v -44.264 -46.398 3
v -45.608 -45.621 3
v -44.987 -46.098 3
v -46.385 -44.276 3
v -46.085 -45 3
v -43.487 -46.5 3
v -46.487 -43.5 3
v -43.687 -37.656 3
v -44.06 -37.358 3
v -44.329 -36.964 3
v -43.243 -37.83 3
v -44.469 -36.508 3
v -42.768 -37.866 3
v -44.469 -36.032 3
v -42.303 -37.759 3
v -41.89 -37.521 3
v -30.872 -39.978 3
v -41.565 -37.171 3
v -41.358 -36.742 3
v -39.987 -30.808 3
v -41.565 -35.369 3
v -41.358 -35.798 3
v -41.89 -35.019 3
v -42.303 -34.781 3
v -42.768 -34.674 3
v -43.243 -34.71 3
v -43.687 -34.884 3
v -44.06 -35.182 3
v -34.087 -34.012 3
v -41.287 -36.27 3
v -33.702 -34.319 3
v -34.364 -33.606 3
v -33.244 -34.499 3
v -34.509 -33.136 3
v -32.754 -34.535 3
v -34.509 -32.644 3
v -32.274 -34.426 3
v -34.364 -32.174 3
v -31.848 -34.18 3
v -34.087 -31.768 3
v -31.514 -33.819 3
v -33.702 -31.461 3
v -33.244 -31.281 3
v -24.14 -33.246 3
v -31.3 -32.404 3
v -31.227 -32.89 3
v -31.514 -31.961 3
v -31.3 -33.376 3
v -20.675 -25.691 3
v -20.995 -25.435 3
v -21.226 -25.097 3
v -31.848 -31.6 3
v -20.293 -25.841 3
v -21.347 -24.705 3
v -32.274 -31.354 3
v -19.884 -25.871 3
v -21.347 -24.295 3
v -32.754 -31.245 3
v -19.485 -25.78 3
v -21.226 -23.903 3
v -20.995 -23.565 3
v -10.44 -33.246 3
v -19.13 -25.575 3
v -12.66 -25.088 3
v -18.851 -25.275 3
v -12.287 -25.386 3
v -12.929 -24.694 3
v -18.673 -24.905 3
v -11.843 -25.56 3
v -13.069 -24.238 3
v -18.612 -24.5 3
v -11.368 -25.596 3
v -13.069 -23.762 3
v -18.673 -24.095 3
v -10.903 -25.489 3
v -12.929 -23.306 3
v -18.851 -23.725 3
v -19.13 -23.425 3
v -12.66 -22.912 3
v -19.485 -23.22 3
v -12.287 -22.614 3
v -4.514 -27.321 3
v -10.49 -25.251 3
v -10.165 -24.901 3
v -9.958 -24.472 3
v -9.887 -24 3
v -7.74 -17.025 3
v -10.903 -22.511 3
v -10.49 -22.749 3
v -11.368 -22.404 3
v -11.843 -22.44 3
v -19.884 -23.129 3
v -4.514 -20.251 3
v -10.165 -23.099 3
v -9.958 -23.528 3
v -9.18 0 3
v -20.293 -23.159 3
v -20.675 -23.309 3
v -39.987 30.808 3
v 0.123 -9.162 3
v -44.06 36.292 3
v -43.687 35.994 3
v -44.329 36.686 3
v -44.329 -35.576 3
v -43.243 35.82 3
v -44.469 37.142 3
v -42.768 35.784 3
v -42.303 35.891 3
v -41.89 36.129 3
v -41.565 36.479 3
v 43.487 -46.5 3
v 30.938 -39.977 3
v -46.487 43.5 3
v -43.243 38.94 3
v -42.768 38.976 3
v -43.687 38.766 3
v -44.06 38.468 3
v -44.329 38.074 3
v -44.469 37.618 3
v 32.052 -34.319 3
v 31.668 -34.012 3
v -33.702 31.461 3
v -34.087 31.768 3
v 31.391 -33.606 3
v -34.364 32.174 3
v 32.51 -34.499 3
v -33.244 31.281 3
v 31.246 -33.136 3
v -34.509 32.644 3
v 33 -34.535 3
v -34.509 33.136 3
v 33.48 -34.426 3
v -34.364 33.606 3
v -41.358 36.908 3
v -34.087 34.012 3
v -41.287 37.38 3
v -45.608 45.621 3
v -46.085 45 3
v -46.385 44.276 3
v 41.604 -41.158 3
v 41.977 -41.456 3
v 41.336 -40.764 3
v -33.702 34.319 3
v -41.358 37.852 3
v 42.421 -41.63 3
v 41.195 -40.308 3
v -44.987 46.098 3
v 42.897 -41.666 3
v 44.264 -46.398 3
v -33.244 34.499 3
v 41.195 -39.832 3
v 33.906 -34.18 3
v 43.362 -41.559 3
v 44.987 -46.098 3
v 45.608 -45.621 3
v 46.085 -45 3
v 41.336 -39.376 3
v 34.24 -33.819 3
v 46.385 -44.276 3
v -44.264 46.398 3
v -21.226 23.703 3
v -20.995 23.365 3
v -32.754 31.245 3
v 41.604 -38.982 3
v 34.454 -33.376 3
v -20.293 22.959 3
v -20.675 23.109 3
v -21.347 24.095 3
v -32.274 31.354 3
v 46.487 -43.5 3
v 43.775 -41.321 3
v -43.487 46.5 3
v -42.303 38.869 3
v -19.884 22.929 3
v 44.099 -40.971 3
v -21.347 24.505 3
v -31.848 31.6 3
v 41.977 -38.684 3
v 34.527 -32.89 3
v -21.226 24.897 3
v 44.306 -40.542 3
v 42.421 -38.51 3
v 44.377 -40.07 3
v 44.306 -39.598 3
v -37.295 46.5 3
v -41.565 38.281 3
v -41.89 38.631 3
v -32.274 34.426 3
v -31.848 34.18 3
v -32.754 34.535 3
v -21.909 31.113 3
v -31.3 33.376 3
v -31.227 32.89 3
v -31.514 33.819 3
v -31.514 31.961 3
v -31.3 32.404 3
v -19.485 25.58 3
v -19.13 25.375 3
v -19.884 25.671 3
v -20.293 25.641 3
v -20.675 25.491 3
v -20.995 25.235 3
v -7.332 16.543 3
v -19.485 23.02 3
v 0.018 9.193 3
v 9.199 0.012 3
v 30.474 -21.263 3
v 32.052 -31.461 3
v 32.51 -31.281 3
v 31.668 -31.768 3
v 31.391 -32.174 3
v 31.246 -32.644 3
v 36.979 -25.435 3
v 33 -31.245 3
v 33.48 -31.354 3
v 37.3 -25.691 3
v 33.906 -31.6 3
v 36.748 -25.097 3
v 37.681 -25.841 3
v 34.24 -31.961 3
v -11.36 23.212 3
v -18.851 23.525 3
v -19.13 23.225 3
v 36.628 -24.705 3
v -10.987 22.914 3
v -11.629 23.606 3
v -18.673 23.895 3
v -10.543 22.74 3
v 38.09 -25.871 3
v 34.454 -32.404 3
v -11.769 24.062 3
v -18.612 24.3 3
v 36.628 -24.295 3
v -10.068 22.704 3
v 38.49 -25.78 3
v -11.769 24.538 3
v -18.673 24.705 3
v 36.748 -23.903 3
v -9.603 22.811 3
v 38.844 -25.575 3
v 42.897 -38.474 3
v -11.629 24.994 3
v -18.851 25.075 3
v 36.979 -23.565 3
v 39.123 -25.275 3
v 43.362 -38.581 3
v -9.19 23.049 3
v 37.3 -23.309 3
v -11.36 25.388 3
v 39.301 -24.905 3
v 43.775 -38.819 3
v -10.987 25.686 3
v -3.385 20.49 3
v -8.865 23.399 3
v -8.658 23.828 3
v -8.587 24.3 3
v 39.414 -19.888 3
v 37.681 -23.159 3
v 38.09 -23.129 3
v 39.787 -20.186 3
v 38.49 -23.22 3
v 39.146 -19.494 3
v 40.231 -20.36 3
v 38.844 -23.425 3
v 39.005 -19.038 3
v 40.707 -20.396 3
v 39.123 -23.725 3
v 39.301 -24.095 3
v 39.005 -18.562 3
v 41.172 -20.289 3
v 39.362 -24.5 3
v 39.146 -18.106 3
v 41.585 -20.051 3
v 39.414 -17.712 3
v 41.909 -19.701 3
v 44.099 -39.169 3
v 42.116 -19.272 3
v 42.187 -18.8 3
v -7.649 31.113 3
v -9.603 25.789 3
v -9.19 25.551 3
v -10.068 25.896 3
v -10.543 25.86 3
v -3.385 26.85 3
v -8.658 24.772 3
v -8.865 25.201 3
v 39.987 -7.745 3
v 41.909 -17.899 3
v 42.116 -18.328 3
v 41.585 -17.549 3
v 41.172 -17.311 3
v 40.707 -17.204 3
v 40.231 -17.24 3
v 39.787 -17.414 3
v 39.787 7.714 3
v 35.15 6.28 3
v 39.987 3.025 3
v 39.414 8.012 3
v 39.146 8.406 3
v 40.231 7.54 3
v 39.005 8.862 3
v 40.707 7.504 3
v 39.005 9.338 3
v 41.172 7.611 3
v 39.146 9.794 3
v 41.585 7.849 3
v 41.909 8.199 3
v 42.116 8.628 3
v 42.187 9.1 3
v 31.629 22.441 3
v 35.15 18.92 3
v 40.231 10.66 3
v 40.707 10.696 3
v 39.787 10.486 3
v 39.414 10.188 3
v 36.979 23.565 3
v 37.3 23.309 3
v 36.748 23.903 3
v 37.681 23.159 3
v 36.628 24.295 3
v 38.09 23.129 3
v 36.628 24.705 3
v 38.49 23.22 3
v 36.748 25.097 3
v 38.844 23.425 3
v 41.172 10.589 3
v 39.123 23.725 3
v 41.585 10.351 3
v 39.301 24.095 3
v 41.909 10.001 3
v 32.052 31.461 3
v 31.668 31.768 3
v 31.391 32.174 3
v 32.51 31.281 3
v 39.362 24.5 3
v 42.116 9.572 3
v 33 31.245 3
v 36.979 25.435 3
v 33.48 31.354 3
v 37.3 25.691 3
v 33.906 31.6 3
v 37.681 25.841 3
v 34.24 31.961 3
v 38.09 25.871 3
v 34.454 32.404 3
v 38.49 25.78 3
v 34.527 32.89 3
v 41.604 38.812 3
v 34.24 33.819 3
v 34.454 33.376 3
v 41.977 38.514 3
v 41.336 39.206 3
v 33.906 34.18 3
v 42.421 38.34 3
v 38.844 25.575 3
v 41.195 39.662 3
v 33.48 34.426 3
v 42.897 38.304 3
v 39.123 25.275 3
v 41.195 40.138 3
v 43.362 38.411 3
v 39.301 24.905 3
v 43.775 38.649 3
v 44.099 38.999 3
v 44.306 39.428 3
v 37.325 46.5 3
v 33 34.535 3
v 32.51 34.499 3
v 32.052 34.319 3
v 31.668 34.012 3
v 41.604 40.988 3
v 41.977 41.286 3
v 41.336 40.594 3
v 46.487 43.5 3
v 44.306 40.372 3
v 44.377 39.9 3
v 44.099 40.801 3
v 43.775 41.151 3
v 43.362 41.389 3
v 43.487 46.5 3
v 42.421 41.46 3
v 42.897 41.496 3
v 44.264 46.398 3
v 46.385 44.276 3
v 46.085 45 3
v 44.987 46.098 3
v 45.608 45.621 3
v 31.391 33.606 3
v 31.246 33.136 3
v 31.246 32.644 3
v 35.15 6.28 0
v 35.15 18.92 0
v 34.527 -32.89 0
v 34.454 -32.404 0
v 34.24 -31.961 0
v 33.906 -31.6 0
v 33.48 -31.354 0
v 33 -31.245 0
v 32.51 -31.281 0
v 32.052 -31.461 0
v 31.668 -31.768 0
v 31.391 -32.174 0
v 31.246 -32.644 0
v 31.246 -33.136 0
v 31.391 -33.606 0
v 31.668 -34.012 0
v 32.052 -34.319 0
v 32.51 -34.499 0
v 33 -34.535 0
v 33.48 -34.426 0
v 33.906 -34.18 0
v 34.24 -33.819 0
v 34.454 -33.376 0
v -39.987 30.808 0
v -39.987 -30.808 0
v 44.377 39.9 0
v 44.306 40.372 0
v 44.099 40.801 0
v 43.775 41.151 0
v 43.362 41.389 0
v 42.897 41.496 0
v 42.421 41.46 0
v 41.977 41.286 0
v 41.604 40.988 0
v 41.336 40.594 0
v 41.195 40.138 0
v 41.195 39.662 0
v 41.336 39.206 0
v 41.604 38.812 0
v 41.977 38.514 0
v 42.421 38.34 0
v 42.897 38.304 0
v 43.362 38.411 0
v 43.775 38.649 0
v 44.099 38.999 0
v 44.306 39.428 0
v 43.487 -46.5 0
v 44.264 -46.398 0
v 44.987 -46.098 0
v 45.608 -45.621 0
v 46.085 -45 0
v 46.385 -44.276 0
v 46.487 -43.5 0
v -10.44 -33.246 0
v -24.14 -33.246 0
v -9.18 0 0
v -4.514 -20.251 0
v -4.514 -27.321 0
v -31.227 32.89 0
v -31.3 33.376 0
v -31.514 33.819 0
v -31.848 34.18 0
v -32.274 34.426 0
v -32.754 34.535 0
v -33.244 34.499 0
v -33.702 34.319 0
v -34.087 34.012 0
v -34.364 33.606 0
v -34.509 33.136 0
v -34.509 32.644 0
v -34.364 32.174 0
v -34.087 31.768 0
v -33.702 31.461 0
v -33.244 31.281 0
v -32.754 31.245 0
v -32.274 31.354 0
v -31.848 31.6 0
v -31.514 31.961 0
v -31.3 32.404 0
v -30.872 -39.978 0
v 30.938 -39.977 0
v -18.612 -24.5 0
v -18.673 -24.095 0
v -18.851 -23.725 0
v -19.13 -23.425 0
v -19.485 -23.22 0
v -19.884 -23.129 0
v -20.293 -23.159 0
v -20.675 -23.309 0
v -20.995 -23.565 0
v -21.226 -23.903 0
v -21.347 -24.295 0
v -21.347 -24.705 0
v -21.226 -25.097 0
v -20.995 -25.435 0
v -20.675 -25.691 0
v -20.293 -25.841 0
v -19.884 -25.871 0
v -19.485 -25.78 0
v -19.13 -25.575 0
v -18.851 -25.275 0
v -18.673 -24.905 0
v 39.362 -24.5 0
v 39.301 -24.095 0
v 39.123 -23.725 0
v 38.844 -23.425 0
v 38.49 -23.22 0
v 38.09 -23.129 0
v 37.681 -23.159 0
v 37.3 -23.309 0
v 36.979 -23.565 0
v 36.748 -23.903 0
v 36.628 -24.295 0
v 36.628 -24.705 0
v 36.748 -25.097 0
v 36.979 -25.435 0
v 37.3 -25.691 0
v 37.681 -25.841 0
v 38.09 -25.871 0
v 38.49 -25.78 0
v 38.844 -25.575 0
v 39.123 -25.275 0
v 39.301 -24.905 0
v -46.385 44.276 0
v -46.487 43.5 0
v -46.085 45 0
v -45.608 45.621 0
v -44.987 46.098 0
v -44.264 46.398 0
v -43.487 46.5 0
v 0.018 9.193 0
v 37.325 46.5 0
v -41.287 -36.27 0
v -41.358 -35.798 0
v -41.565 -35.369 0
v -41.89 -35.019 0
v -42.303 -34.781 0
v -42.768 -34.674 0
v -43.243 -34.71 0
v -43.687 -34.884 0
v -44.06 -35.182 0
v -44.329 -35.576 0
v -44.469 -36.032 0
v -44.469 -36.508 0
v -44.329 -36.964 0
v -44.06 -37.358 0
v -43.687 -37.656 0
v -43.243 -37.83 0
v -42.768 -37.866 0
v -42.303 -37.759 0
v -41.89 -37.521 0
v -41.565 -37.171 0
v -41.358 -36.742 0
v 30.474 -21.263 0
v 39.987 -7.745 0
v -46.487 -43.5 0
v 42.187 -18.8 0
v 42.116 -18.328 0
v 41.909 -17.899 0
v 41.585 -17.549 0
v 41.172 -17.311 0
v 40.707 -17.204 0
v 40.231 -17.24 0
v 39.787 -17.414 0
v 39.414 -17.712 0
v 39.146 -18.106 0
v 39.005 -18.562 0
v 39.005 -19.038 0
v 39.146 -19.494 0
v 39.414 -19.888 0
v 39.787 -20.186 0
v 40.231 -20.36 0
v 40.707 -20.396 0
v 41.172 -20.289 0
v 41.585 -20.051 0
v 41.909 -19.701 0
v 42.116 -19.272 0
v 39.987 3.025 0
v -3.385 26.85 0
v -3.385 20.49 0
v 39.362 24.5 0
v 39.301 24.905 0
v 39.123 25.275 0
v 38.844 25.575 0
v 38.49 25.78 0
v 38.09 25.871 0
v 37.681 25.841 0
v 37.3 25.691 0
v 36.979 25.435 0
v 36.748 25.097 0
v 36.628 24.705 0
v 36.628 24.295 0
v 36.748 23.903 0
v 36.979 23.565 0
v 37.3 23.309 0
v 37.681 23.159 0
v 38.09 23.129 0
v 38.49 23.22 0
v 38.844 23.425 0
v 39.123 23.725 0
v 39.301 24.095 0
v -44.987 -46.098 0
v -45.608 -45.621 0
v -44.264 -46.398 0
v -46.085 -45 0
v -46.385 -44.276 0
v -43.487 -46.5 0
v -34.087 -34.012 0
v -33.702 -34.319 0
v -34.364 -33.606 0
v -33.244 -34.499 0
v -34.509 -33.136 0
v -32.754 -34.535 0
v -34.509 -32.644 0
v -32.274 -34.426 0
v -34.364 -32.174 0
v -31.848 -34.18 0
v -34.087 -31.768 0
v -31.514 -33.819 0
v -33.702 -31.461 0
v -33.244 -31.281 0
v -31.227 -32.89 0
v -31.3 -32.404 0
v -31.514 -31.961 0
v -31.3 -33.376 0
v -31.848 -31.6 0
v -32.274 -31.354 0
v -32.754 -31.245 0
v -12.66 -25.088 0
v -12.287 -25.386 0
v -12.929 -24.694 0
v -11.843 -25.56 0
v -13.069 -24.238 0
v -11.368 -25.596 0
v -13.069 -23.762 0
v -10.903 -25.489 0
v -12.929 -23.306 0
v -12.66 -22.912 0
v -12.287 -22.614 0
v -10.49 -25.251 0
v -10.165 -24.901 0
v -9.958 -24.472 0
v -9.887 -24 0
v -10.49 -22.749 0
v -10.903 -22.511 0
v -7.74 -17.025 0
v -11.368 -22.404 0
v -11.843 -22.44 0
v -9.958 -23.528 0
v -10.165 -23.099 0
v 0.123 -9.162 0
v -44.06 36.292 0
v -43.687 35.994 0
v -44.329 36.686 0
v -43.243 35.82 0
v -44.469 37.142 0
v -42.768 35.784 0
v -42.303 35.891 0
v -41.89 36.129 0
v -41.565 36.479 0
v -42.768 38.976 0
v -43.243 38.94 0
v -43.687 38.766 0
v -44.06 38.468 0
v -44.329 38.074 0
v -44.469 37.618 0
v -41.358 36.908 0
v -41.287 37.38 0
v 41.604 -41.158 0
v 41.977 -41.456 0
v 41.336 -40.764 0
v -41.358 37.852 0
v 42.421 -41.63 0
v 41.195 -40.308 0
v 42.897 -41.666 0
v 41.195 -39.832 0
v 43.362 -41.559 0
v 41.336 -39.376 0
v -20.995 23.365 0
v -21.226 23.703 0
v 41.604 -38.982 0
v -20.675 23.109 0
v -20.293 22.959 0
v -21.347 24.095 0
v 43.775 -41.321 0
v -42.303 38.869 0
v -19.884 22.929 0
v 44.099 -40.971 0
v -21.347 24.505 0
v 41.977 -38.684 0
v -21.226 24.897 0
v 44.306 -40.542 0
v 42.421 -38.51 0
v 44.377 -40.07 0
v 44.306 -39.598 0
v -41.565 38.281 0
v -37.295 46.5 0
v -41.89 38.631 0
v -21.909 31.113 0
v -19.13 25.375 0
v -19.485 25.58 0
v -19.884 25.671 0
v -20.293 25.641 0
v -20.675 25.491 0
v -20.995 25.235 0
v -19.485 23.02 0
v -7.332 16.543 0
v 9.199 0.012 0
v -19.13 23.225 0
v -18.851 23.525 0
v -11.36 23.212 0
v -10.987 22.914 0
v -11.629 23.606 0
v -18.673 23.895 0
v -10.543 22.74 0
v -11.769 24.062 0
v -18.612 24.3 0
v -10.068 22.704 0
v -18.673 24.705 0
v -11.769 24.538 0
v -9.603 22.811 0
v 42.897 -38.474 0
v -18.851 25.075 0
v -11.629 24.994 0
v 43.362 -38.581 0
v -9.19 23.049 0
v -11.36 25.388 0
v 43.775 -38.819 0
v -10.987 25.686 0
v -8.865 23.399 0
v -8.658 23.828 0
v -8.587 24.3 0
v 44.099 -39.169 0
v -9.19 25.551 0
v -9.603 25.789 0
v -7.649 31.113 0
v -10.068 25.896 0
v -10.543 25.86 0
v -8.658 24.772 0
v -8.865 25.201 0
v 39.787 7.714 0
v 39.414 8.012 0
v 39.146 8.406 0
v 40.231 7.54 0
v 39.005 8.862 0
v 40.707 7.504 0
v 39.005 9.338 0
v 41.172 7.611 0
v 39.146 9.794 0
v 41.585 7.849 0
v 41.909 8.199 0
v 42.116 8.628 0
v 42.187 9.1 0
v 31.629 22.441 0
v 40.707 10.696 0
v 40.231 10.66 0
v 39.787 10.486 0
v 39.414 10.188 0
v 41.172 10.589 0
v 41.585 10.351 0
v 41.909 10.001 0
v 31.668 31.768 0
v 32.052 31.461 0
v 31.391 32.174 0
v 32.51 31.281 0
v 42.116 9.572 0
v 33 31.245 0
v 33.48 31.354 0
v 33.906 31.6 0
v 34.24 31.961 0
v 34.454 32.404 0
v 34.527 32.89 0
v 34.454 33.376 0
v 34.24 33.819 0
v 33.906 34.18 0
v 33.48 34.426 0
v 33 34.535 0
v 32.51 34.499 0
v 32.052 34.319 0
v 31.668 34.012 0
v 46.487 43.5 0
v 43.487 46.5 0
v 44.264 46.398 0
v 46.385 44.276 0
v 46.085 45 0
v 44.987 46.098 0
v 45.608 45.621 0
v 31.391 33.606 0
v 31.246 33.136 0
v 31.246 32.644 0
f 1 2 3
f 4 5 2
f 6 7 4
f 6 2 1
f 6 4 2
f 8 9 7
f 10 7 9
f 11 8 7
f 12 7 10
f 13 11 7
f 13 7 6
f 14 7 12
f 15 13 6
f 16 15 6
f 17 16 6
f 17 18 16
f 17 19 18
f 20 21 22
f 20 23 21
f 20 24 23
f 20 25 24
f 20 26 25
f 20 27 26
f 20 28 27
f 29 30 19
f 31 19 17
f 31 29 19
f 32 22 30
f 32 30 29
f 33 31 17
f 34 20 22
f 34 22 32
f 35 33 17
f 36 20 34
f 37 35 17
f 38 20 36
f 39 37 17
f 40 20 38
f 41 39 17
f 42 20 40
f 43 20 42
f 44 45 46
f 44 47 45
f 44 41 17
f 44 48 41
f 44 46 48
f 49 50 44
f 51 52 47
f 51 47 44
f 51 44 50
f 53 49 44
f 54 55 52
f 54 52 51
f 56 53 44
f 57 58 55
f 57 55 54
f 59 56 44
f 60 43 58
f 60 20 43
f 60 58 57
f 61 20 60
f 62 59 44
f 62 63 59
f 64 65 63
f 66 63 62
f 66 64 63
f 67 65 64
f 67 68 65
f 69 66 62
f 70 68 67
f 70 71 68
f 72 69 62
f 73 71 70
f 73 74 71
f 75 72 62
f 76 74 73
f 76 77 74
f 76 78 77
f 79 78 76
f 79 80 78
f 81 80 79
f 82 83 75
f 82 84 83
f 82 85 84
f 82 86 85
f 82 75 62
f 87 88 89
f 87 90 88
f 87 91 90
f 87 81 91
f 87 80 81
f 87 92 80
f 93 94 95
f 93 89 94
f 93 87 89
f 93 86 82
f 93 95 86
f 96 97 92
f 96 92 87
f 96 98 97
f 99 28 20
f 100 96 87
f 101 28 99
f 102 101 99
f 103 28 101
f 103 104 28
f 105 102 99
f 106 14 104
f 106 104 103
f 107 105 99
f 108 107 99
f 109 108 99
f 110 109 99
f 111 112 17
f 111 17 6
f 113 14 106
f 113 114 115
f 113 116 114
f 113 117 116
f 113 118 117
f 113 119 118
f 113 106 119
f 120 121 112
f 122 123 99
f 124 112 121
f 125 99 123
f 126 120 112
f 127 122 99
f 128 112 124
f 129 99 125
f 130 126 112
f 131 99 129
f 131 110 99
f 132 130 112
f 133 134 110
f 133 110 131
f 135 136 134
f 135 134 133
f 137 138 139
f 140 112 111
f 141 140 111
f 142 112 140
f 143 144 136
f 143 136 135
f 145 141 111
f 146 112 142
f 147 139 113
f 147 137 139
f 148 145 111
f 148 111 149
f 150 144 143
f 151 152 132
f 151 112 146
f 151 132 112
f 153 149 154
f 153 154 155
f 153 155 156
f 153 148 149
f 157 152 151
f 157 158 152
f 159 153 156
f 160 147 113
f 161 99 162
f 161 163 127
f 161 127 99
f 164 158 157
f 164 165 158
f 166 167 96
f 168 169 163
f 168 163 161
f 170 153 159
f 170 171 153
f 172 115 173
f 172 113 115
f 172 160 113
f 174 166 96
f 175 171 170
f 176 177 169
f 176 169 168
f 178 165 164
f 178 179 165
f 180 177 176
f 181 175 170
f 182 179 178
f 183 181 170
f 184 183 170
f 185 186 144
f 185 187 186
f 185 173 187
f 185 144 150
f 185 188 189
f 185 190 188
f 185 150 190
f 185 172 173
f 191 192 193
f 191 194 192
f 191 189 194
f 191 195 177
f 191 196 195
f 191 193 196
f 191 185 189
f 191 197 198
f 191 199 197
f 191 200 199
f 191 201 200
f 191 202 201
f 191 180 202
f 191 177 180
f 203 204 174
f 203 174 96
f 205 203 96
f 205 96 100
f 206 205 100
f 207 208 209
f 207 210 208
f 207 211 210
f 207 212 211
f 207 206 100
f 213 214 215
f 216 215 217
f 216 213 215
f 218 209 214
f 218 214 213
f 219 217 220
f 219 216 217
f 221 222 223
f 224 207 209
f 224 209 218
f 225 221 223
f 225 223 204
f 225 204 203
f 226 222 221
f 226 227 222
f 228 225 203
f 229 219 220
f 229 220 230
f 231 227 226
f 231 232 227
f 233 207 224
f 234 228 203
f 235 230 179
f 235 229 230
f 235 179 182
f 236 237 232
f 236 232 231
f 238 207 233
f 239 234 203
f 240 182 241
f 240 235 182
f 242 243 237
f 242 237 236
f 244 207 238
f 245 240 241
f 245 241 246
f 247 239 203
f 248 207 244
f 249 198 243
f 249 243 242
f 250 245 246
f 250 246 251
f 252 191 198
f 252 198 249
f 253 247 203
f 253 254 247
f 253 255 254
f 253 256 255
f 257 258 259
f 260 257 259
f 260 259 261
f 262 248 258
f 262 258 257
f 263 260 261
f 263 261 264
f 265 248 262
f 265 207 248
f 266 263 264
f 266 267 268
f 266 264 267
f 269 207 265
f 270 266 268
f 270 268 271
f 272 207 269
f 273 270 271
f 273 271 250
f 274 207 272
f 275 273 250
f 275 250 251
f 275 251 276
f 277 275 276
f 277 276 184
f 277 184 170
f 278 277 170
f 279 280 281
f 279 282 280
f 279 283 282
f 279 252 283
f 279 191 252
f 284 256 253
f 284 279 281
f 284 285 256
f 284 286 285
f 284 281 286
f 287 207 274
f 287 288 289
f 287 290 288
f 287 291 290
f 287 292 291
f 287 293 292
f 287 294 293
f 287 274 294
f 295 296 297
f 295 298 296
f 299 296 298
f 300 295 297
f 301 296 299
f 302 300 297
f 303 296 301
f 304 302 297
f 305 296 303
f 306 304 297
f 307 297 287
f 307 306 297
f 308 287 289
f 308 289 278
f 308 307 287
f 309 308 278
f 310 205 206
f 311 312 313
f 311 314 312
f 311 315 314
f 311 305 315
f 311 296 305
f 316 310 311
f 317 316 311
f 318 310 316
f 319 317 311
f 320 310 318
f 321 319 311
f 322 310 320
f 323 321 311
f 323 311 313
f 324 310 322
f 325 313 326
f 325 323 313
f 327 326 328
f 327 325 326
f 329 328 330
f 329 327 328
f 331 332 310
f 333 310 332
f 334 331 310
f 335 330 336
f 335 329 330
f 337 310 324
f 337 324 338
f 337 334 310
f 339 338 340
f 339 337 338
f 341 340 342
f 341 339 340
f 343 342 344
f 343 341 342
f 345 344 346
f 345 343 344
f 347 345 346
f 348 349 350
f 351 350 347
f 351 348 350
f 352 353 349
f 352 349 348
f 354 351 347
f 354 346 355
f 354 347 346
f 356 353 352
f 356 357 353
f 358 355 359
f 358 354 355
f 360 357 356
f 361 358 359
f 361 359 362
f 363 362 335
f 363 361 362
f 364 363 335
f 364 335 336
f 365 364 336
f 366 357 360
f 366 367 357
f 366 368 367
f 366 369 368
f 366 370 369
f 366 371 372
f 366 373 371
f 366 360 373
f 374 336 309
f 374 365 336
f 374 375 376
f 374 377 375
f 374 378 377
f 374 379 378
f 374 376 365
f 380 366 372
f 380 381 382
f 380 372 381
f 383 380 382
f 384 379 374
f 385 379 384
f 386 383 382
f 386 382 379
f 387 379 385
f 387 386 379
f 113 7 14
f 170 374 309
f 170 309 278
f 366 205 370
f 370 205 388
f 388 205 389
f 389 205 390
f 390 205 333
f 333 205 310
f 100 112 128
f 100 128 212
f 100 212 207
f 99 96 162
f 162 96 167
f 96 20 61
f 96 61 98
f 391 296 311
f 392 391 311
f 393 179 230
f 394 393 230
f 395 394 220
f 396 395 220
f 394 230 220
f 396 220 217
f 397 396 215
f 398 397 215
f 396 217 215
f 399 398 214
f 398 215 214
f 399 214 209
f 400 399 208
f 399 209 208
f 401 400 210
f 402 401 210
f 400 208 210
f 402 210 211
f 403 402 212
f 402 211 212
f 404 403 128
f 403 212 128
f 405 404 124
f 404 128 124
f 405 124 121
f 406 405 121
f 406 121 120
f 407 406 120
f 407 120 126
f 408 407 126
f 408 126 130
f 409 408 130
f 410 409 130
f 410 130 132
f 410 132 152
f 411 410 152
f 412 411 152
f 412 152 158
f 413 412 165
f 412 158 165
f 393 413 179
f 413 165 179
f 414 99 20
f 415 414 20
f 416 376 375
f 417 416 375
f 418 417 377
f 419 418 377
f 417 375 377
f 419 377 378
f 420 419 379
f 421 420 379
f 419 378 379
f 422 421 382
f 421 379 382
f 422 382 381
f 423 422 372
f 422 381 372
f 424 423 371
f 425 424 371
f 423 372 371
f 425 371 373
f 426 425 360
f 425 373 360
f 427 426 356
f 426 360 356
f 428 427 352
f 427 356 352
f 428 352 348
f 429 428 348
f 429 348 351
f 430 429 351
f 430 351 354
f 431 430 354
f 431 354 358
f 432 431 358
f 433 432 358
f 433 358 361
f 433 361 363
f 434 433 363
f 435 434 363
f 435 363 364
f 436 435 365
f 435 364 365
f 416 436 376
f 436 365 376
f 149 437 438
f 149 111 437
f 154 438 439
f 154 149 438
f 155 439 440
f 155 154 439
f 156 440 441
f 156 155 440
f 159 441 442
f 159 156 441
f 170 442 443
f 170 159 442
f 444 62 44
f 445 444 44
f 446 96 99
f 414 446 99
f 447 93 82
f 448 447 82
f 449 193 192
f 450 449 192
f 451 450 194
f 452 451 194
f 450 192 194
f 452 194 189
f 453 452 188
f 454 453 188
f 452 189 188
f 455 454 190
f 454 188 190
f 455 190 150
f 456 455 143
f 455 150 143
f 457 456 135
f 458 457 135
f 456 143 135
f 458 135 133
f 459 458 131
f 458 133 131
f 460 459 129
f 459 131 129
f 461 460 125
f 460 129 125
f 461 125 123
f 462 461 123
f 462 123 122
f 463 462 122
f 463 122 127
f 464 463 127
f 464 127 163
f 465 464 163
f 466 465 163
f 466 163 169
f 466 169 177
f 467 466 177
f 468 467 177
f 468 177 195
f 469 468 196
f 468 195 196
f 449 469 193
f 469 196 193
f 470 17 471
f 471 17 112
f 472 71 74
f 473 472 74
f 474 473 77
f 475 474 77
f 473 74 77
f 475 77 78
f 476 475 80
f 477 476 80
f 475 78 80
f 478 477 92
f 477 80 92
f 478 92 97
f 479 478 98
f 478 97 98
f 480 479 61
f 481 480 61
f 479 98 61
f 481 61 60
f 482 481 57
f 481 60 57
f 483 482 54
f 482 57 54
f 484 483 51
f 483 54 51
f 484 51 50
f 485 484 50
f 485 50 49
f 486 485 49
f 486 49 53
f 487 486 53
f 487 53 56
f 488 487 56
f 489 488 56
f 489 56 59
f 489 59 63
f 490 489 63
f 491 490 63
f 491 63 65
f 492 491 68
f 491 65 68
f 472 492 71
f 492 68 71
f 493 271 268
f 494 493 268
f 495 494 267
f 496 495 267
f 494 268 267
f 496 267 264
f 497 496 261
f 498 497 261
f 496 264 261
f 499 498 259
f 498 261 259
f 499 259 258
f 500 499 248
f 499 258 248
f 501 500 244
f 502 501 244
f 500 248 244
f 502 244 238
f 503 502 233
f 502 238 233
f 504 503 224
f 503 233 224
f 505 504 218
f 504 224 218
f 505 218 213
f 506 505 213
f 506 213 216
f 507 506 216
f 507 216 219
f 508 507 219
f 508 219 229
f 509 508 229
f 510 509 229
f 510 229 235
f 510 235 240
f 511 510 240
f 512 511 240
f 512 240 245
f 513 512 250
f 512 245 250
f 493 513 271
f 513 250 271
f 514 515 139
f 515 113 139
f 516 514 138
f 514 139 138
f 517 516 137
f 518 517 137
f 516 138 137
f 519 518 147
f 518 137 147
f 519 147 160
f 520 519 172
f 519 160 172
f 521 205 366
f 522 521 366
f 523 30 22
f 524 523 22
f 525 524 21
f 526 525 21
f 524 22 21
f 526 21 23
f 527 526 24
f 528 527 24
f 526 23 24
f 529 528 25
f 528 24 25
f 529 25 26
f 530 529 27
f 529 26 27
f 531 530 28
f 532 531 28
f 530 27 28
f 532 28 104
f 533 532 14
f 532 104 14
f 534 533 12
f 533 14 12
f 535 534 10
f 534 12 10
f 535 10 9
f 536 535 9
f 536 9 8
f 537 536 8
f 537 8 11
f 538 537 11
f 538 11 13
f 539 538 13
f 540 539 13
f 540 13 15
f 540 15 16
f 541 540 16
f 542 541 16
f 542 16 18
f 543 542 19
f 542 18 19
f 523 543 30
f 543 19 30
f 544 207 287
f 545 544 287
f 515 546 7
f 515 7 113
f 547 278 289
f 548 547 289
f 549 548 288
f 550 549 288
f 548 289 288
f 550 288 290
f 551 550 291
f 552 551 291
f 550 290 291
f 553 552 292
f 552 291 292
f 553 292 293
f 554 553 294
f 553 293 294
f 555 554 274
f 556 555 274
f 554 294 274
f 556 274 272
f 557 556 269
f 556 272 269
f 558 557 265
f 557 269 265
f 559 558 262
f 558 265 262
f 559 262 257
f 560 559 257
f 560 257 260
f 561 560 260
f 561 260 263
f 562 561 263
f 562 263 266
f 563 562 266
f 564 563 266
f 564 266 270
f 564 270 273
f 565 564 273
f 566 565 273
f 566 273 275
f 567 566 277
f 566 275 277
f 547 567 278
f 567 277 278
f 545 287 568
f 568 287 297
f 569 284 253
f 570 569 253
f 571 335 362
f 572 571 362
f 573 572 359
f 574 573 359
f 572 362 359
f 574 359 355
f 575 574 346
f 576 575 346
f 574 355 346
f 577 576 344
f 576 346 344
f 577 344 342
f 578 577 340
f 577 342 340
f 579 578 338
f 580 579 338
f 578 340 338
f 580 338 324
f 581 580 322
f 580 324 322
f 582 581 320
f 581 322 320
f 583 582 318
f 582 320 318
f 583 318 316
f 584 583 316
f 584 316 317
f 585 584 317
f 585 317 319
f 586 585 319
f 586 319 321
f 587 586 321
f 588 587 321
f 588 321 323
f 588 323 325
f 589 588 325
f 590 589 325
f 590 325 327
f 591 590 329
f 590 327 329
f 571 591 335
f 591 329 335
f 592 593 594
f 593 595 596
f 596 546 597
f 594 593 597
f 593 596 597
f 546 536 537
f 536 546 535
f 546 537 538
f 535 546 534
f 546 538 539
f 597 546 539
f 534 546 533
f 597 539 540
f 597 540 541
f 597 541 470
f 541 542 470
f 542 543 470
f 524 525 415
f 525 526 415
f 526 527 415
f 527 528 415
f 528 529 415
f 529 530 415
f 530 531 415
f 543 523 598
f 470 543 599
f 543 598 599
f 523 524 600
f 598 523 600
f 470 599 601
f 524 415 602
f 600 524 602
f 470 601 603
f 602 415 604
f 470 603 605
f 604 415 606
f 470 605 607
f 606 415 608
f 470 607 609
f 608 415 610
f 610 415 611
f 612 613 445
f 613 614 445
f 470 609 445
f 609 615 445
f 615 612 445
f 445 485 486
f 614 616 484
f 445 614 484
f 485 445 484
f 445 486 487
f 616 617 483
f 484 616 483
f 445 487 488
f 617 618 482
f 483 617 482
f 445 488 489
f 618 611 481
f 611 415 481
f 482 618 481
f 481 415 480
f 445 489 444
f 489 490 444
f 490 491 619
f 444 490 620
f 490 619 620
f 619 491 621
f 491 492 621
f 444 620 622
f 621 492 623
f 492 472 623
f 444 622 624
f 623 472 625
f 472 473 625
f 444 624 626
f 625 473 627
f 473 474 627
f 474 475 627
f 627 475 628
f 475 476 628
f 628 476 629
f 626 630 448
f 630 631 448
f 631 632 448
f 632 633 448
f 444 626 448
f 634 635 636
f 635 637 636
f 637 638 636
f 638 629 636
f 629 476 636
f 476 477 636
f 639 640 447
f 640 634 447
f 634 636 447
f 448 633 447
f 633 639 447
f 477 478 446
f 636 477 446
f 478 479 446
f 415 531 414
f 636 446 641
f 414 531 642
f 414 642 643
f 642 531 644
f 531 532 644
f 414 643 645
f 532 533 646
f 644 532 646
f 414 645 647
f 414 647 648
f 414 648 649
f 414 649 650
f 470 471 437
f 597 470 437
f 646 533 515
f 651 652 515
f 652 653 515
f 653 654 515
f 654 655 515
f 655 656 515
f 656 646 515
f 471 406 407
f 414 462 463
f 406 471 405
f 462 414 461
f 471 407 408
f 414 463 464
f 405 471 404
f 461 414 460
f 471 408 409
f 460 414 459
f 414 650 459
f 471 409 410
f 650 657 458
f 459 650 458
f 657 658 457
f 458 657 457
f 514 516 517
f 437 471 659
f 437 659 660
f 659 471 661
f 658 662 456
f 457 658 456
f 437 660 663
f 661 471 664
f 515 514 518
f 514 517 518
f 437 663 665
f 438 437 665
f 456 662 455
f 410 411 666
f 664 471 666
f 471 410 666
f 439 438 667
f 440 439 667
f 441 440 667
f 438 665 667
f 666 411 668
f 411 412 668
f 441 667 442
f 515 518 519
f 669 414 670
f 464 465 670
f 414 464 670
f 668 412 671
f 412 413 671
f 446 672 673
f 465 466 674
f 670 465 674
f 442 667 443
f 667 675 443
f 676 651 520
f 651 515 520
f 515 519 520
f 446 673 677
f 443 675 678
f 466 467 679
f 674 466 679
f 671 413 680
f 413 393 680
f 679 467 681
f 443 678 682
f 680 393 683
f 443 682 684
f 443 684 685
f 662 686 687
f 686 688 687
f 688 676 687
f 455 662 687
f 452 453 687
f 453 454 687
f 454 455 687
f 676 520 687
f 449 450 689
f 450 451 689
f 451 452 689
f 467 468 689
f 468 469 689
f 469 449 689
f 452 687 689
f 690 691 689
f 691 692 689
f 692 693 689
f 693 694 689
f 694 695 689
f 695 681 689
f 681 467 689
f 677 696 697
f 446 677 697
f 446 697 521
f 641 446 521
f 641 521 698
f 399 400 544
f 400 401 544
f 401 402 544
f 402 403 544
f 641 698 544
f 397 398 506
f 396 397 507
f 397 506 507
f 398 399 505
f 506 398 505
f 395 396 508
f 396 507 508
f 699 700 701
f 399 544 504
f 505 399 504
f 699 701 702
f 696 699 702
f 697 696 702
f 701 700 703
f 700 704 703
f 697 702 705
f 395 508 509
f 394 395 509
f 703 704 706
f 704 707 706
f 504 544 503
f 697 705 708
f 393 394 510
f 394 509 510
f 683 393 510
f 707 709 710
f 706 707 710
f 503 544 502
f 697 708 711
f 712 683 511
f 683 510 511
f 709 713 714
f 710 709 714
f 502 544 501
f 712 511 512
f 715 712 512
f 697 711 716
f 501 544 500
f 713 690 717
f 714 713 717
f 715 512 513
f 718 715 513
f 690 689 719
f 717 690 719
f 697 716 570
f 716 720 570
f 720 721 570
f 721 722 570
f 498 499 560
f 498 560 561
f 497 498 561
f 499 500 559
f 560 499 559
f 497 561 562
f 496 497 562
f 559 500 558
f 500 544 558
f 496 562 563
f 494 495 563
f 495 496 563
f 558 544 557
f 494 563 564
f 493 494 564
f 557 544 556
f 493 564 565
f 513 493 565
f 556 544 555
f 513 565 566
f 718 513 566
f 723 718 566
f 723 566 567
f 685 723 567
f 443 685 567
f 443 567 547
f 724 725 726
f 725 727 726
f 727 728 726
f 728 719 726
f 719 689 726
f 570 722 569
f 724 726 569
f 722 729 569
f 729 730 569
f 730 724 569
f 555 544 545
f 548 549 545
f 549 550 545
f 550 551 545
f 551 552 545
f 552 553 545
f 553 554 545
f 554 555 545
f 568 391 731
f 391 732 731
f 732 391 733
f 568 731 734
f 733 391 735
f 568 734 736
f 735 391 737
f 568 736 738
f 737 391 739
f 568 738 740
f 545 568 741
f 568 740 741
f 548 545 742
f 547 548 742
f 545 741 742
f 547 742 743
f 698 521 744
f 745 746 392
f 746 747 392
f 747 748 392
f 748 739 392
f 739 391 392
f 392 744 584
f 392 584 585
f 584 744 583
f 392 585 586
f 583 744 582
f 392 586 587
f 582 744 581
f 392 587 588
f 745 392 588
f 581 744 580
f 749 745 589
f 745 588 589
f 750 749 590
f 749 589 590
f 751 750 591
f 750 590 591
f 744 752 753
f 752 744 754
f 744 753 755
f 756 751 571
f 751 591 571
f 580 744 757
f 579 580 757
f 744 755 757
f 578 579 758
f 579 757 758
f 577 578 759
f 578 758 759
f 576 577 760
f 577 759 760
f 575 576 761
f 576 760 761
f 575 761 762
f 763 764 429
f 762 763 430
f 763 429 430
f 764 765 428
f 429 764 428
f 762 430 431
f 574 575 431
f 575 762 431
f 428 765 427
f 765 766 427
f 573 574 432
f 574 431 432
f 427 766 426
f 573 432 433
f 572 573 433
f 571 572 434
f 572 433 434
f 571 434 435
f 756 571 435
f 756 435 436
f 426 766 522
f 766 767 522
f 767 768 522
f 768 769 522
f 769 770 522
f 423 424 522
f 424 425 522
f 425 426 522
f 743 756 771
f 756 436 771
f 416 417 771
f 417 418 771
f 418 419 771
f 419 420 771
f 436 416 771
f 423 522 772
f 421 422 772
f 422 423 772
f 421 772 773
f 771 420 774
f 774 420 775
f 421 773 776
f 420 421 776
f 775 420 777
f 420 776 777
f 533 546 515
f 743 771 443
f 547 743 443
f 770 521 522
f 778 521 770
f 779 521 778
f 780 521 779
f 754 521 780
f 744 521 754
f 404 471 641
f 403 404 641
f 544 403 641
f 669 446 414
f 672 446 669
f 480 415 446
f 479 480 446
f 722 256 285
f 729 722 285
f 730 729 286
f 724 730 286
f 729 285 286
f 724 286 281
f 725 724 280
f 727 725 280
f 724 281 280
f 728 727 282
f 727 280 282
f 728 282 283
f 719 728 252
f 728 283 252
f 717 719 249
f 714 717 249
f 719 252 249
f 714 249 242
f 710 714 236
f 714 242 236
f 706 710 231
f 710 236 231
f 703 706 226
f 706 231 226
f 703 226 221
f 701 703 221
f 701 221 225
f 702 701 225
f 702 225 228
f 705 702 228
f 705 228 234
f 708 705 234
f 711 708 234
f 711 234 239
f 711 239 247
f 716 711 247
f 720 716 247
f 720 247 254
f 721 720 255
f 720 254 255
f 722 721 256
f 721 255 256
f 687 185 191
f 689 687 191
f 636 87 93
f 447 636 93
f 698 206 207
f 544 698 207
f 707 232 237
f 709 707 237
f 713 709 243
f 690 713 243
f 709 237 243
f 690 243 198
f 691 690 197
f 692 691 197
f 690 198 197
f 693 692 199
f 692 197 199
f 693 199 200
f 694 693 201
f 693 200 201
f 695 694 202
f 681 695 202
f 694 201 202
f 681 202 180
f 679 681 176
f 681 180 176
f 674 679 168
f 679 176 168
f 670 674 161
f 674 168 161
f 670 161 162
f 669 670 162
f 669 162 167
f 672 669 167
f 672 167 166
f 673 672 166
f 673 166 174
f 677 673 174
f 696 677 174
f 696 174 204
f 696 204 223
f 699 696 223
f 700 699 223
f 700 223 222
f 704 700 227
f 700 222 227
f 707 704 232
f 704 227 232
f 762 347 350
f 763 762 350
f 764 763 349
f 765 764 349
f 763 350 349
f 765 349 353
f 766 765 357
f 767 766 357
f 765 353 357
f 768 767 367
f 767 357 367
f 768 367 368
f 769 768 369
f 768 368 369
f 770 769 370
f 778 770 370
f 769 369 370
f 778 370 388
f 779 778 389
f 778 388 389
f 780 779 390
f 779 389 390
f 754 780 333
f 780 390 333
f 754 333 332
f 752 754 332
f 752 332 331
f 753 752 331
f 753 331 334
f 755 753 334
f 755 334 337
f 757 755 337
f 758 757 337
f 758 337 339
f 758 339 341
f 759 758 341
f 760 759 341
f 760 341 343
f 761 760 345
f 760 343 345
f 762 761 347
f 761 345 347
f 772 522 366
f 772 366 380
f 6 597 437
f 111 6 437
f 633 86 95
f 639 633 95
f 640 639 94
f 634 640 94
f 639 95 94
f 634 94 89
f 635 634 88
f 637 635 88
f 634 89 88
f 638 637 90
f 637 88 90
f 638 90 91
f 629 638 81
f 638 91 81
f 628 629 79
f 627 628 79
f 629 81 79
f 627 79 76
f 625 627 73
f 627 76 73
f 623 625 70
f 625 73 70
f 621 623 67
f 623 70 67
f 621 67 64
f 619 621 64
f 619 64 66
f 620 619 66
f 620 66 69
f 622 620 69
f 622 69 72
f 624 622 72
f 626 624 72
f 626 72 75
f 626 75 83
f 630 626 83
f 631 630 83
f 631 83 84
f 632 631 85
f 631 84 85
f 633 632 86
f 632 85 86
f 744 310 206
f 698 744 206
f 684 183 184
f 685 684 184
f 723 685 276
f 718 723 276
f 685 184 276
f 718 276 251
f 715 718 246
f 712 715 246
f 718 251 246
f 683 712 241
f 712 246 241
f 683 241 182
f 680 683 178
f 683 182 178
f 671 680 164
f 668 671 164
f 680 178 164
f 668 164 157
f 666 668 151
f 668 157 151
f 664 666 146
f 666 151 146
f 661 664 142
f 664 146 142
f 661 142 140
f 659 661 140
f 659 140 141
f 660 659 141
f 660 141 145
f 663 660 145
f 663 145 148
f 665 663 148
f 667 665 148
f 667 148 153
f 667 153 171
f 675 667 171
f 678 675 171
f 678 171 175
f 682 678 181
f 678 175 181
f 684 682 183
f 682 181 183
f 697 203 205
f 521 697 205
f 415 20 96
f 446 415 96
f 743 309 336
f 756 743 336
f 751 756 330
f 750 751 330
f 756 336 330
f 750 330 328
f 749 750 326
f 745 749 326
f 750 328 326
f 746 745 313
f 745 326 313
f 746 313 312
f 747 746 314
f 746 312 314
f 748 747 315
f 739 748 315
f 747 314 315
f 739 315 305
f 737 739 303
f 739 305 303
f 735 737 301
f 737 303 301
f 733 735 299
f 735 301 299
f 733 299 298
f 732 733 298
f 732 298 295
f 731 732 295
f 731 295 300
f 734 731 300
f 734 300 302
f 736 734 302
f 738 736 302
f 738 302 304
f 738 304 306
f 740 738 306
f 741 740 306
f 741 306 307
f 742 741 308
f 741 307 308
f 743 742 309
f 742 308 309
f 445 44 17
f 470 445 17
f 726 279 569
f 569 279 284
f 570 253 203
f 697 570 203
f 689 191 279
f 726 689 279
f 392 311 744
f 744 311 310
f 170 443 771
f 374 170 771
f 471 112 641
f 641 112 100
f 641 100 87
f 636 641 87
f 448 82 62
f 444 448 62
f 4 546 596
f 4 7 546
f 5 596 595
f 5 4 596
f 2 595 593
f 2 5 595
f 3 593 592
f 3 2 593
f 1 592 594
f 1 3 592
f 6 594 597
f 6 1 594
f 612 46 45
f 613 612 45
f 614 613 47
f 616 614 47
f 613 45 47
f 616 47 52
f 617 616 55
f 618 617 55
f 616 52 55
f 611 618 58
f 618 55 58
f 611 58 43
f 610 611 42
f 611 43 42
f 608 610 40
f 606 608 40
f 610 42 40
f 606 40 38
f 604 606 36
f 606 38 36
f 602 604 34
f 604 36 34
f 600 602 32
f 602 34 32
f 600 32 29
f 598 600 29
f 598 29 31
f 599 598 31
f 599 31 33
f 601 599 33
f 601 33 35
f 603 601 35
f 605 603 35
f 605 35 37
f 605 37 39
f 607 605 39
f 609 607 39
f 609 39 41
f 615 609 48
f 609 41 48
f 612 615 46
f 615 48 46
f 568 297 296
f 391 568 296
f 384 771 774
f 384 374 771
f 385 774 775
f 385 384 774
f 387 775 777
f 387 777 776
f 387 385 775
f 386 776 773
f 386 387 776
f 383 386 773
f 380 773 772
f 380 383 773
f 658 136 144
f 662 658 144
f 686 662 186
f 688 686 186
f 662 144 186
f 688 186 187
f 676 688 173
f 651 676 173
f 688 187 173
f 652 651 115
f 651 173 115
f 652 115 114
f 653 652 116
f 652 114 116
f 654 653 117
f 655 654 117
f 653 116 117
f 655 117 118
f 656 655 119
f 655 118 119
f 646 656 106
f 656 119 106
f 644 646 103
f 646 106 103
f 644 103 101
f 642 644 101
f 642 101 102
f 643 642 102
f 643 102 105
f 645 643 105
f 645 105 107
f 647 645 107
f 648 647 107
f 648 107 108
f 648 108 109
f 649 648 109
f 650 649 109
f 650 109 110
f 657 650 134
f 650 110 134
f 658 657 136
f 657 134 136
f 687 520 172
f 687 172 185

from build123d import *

# Parameters (mm, degrees)
SKETCH1_W           = 92.97433
SKETCH1_H           = 93
BOSS_EXTRUDE1_DEPTH = 3
FILLET1_R           = 3
CUT_EXTRUDE1_DEPTH  = 3
SKETCH3_R           = 1.6
SKETCH3_R_2         = 1.65
SKETCH3_R_3         = 1.375
CUT_EXTRUDE2_DEPTH  = 3
SKETCH4_R           = 1.6
SKETCH4_R_2         = 1.65
SKETCH4_R_3         = 1.375
CUT_EXTRUDE3_DEPTH  = 3


with BuildPart() as part:
    # Sketch1 → Boss-Extrude1 (new body)
    with BuildSketch(Plane.XY):
        Rectangle(SKETCH1_W, SKETCH1_H)
    extrude(amount=BOSS_EXTRUDE1_DEPTH)

    # Fillet1
    fillet1_edges = [part.edges().sort_by_distance(p)[0] for p in [
        (46.487165, -46.5, 1.5),
        (-46.487165, -46.5, 1.5),
        (-46.487165, 46.5, 1.5),
        (46.487165, 46.5, 1.5),
    ]]
    fillet(fillet1_edges, radius=FILLET1_R)

    # Sketch2 → Cut-Extrude1 (cut)
    with BuildSketch(Plane.XY.offset(3)):
        Polygon((-39.987165, 30.80761), (-39.987165, -30.80761), (-9.179568981, 0), align=None)
        Polygon((-37.295165, 46.5), (-21.908517975, 31.113359908), (-7.648517975, 31.113359908), (-3.384663123, 26.849506978), (-3.384663123, 20.489506978), (-7.331622093, 16.54254623), (0.01788969, 9.193037759), (37.324835, 46.5), align=None)
        Polygon((30.474058677, -21.263117504), (39.987165, -7.74491836), (39.987165, 3.02508164), (35.150146737, 6.279640646), (35.150146737, 18.919640646), (31.628754168, 22.441031617), (9.199332158, 0.011599428), align=None)
        Polygon((-24.13996688, -33.24619021), (-30.87162192, -39.977848283), (30.93837808, -39.977358271), (0.122892986, -9.161887063), (-7.74013265, -17.024916241), (-4.514413398, -20.250634039), (-4.514413398, -27.320634039), (-10.43996688, -33.24619021), align=None)
    extrude(amount=-CUT_EXTRUDE1_DEPTH, mode=Mode.SUBTRACT)

    # Sketch3 → Cut-Extrude2 (cut)
    with BuildSketch(Plane.XY.offset(3)):
        with Locations((-42.887165, 37.38)):
            Circle(SKETCH3_R)
        with Locations((-32.877165, 32.89)):
            Circle(SKETCH3_R_2)
        with Locations((-19.987165, 24.3)):
            Circle(SKETCH3_R_3)
        with Locations((-10.187165, 24.3)):
            Circle(SKETCH3_R)
    extrude(amount=-CUT_EXTRUDE2_DEPTH, mode=Mode.SUBTRACT)

    # Sketch4 → Cut-Extrude3 (cut)
    with BuildSketch(Plane.XY.offset(3)):
        with Locations((42.777165, -40.07)):
            Circle(SKETCH4_R)
        with Locations((32.877165, -32.89)):
            Circle(SKETCH4_R_2)
        with Locations((37.987165, -24.5)):
            Circle(SKETCH4_R_3)
        with Locations((40.587165, -18.8)):
            Circle(SKETCH4_R)
        with Locations((-42.887165, -36.27)):
            Circle(SKETCH4_R)
        with Locations((-32.877165, -32.89)):
            Circle(SKETCH4_R_2)
        with Locations((-19.987165, -24.5)):
            Circle(SKETCH4_R_3)
        with Locations((-11.487165, -24)):
            Circle(SKETCH4_R)
        with Locations((42.777165, 39.9)):
            Circle(SKETCH4_R)
        with Locations((32.877165, 32.89)):
            Circle(SKETCH4_R_2)
        with Locations((37.987165, 24.5)):
            Circle(SKETCH4_R_3)
        with Locations((40.587165, 9.1)):
            Circle(SKETCH4_R)
    extrude(amount=-CUT_EXTRUDE3_DEPTH, mode=Mode.SUBTRACT)


solid = part.part
